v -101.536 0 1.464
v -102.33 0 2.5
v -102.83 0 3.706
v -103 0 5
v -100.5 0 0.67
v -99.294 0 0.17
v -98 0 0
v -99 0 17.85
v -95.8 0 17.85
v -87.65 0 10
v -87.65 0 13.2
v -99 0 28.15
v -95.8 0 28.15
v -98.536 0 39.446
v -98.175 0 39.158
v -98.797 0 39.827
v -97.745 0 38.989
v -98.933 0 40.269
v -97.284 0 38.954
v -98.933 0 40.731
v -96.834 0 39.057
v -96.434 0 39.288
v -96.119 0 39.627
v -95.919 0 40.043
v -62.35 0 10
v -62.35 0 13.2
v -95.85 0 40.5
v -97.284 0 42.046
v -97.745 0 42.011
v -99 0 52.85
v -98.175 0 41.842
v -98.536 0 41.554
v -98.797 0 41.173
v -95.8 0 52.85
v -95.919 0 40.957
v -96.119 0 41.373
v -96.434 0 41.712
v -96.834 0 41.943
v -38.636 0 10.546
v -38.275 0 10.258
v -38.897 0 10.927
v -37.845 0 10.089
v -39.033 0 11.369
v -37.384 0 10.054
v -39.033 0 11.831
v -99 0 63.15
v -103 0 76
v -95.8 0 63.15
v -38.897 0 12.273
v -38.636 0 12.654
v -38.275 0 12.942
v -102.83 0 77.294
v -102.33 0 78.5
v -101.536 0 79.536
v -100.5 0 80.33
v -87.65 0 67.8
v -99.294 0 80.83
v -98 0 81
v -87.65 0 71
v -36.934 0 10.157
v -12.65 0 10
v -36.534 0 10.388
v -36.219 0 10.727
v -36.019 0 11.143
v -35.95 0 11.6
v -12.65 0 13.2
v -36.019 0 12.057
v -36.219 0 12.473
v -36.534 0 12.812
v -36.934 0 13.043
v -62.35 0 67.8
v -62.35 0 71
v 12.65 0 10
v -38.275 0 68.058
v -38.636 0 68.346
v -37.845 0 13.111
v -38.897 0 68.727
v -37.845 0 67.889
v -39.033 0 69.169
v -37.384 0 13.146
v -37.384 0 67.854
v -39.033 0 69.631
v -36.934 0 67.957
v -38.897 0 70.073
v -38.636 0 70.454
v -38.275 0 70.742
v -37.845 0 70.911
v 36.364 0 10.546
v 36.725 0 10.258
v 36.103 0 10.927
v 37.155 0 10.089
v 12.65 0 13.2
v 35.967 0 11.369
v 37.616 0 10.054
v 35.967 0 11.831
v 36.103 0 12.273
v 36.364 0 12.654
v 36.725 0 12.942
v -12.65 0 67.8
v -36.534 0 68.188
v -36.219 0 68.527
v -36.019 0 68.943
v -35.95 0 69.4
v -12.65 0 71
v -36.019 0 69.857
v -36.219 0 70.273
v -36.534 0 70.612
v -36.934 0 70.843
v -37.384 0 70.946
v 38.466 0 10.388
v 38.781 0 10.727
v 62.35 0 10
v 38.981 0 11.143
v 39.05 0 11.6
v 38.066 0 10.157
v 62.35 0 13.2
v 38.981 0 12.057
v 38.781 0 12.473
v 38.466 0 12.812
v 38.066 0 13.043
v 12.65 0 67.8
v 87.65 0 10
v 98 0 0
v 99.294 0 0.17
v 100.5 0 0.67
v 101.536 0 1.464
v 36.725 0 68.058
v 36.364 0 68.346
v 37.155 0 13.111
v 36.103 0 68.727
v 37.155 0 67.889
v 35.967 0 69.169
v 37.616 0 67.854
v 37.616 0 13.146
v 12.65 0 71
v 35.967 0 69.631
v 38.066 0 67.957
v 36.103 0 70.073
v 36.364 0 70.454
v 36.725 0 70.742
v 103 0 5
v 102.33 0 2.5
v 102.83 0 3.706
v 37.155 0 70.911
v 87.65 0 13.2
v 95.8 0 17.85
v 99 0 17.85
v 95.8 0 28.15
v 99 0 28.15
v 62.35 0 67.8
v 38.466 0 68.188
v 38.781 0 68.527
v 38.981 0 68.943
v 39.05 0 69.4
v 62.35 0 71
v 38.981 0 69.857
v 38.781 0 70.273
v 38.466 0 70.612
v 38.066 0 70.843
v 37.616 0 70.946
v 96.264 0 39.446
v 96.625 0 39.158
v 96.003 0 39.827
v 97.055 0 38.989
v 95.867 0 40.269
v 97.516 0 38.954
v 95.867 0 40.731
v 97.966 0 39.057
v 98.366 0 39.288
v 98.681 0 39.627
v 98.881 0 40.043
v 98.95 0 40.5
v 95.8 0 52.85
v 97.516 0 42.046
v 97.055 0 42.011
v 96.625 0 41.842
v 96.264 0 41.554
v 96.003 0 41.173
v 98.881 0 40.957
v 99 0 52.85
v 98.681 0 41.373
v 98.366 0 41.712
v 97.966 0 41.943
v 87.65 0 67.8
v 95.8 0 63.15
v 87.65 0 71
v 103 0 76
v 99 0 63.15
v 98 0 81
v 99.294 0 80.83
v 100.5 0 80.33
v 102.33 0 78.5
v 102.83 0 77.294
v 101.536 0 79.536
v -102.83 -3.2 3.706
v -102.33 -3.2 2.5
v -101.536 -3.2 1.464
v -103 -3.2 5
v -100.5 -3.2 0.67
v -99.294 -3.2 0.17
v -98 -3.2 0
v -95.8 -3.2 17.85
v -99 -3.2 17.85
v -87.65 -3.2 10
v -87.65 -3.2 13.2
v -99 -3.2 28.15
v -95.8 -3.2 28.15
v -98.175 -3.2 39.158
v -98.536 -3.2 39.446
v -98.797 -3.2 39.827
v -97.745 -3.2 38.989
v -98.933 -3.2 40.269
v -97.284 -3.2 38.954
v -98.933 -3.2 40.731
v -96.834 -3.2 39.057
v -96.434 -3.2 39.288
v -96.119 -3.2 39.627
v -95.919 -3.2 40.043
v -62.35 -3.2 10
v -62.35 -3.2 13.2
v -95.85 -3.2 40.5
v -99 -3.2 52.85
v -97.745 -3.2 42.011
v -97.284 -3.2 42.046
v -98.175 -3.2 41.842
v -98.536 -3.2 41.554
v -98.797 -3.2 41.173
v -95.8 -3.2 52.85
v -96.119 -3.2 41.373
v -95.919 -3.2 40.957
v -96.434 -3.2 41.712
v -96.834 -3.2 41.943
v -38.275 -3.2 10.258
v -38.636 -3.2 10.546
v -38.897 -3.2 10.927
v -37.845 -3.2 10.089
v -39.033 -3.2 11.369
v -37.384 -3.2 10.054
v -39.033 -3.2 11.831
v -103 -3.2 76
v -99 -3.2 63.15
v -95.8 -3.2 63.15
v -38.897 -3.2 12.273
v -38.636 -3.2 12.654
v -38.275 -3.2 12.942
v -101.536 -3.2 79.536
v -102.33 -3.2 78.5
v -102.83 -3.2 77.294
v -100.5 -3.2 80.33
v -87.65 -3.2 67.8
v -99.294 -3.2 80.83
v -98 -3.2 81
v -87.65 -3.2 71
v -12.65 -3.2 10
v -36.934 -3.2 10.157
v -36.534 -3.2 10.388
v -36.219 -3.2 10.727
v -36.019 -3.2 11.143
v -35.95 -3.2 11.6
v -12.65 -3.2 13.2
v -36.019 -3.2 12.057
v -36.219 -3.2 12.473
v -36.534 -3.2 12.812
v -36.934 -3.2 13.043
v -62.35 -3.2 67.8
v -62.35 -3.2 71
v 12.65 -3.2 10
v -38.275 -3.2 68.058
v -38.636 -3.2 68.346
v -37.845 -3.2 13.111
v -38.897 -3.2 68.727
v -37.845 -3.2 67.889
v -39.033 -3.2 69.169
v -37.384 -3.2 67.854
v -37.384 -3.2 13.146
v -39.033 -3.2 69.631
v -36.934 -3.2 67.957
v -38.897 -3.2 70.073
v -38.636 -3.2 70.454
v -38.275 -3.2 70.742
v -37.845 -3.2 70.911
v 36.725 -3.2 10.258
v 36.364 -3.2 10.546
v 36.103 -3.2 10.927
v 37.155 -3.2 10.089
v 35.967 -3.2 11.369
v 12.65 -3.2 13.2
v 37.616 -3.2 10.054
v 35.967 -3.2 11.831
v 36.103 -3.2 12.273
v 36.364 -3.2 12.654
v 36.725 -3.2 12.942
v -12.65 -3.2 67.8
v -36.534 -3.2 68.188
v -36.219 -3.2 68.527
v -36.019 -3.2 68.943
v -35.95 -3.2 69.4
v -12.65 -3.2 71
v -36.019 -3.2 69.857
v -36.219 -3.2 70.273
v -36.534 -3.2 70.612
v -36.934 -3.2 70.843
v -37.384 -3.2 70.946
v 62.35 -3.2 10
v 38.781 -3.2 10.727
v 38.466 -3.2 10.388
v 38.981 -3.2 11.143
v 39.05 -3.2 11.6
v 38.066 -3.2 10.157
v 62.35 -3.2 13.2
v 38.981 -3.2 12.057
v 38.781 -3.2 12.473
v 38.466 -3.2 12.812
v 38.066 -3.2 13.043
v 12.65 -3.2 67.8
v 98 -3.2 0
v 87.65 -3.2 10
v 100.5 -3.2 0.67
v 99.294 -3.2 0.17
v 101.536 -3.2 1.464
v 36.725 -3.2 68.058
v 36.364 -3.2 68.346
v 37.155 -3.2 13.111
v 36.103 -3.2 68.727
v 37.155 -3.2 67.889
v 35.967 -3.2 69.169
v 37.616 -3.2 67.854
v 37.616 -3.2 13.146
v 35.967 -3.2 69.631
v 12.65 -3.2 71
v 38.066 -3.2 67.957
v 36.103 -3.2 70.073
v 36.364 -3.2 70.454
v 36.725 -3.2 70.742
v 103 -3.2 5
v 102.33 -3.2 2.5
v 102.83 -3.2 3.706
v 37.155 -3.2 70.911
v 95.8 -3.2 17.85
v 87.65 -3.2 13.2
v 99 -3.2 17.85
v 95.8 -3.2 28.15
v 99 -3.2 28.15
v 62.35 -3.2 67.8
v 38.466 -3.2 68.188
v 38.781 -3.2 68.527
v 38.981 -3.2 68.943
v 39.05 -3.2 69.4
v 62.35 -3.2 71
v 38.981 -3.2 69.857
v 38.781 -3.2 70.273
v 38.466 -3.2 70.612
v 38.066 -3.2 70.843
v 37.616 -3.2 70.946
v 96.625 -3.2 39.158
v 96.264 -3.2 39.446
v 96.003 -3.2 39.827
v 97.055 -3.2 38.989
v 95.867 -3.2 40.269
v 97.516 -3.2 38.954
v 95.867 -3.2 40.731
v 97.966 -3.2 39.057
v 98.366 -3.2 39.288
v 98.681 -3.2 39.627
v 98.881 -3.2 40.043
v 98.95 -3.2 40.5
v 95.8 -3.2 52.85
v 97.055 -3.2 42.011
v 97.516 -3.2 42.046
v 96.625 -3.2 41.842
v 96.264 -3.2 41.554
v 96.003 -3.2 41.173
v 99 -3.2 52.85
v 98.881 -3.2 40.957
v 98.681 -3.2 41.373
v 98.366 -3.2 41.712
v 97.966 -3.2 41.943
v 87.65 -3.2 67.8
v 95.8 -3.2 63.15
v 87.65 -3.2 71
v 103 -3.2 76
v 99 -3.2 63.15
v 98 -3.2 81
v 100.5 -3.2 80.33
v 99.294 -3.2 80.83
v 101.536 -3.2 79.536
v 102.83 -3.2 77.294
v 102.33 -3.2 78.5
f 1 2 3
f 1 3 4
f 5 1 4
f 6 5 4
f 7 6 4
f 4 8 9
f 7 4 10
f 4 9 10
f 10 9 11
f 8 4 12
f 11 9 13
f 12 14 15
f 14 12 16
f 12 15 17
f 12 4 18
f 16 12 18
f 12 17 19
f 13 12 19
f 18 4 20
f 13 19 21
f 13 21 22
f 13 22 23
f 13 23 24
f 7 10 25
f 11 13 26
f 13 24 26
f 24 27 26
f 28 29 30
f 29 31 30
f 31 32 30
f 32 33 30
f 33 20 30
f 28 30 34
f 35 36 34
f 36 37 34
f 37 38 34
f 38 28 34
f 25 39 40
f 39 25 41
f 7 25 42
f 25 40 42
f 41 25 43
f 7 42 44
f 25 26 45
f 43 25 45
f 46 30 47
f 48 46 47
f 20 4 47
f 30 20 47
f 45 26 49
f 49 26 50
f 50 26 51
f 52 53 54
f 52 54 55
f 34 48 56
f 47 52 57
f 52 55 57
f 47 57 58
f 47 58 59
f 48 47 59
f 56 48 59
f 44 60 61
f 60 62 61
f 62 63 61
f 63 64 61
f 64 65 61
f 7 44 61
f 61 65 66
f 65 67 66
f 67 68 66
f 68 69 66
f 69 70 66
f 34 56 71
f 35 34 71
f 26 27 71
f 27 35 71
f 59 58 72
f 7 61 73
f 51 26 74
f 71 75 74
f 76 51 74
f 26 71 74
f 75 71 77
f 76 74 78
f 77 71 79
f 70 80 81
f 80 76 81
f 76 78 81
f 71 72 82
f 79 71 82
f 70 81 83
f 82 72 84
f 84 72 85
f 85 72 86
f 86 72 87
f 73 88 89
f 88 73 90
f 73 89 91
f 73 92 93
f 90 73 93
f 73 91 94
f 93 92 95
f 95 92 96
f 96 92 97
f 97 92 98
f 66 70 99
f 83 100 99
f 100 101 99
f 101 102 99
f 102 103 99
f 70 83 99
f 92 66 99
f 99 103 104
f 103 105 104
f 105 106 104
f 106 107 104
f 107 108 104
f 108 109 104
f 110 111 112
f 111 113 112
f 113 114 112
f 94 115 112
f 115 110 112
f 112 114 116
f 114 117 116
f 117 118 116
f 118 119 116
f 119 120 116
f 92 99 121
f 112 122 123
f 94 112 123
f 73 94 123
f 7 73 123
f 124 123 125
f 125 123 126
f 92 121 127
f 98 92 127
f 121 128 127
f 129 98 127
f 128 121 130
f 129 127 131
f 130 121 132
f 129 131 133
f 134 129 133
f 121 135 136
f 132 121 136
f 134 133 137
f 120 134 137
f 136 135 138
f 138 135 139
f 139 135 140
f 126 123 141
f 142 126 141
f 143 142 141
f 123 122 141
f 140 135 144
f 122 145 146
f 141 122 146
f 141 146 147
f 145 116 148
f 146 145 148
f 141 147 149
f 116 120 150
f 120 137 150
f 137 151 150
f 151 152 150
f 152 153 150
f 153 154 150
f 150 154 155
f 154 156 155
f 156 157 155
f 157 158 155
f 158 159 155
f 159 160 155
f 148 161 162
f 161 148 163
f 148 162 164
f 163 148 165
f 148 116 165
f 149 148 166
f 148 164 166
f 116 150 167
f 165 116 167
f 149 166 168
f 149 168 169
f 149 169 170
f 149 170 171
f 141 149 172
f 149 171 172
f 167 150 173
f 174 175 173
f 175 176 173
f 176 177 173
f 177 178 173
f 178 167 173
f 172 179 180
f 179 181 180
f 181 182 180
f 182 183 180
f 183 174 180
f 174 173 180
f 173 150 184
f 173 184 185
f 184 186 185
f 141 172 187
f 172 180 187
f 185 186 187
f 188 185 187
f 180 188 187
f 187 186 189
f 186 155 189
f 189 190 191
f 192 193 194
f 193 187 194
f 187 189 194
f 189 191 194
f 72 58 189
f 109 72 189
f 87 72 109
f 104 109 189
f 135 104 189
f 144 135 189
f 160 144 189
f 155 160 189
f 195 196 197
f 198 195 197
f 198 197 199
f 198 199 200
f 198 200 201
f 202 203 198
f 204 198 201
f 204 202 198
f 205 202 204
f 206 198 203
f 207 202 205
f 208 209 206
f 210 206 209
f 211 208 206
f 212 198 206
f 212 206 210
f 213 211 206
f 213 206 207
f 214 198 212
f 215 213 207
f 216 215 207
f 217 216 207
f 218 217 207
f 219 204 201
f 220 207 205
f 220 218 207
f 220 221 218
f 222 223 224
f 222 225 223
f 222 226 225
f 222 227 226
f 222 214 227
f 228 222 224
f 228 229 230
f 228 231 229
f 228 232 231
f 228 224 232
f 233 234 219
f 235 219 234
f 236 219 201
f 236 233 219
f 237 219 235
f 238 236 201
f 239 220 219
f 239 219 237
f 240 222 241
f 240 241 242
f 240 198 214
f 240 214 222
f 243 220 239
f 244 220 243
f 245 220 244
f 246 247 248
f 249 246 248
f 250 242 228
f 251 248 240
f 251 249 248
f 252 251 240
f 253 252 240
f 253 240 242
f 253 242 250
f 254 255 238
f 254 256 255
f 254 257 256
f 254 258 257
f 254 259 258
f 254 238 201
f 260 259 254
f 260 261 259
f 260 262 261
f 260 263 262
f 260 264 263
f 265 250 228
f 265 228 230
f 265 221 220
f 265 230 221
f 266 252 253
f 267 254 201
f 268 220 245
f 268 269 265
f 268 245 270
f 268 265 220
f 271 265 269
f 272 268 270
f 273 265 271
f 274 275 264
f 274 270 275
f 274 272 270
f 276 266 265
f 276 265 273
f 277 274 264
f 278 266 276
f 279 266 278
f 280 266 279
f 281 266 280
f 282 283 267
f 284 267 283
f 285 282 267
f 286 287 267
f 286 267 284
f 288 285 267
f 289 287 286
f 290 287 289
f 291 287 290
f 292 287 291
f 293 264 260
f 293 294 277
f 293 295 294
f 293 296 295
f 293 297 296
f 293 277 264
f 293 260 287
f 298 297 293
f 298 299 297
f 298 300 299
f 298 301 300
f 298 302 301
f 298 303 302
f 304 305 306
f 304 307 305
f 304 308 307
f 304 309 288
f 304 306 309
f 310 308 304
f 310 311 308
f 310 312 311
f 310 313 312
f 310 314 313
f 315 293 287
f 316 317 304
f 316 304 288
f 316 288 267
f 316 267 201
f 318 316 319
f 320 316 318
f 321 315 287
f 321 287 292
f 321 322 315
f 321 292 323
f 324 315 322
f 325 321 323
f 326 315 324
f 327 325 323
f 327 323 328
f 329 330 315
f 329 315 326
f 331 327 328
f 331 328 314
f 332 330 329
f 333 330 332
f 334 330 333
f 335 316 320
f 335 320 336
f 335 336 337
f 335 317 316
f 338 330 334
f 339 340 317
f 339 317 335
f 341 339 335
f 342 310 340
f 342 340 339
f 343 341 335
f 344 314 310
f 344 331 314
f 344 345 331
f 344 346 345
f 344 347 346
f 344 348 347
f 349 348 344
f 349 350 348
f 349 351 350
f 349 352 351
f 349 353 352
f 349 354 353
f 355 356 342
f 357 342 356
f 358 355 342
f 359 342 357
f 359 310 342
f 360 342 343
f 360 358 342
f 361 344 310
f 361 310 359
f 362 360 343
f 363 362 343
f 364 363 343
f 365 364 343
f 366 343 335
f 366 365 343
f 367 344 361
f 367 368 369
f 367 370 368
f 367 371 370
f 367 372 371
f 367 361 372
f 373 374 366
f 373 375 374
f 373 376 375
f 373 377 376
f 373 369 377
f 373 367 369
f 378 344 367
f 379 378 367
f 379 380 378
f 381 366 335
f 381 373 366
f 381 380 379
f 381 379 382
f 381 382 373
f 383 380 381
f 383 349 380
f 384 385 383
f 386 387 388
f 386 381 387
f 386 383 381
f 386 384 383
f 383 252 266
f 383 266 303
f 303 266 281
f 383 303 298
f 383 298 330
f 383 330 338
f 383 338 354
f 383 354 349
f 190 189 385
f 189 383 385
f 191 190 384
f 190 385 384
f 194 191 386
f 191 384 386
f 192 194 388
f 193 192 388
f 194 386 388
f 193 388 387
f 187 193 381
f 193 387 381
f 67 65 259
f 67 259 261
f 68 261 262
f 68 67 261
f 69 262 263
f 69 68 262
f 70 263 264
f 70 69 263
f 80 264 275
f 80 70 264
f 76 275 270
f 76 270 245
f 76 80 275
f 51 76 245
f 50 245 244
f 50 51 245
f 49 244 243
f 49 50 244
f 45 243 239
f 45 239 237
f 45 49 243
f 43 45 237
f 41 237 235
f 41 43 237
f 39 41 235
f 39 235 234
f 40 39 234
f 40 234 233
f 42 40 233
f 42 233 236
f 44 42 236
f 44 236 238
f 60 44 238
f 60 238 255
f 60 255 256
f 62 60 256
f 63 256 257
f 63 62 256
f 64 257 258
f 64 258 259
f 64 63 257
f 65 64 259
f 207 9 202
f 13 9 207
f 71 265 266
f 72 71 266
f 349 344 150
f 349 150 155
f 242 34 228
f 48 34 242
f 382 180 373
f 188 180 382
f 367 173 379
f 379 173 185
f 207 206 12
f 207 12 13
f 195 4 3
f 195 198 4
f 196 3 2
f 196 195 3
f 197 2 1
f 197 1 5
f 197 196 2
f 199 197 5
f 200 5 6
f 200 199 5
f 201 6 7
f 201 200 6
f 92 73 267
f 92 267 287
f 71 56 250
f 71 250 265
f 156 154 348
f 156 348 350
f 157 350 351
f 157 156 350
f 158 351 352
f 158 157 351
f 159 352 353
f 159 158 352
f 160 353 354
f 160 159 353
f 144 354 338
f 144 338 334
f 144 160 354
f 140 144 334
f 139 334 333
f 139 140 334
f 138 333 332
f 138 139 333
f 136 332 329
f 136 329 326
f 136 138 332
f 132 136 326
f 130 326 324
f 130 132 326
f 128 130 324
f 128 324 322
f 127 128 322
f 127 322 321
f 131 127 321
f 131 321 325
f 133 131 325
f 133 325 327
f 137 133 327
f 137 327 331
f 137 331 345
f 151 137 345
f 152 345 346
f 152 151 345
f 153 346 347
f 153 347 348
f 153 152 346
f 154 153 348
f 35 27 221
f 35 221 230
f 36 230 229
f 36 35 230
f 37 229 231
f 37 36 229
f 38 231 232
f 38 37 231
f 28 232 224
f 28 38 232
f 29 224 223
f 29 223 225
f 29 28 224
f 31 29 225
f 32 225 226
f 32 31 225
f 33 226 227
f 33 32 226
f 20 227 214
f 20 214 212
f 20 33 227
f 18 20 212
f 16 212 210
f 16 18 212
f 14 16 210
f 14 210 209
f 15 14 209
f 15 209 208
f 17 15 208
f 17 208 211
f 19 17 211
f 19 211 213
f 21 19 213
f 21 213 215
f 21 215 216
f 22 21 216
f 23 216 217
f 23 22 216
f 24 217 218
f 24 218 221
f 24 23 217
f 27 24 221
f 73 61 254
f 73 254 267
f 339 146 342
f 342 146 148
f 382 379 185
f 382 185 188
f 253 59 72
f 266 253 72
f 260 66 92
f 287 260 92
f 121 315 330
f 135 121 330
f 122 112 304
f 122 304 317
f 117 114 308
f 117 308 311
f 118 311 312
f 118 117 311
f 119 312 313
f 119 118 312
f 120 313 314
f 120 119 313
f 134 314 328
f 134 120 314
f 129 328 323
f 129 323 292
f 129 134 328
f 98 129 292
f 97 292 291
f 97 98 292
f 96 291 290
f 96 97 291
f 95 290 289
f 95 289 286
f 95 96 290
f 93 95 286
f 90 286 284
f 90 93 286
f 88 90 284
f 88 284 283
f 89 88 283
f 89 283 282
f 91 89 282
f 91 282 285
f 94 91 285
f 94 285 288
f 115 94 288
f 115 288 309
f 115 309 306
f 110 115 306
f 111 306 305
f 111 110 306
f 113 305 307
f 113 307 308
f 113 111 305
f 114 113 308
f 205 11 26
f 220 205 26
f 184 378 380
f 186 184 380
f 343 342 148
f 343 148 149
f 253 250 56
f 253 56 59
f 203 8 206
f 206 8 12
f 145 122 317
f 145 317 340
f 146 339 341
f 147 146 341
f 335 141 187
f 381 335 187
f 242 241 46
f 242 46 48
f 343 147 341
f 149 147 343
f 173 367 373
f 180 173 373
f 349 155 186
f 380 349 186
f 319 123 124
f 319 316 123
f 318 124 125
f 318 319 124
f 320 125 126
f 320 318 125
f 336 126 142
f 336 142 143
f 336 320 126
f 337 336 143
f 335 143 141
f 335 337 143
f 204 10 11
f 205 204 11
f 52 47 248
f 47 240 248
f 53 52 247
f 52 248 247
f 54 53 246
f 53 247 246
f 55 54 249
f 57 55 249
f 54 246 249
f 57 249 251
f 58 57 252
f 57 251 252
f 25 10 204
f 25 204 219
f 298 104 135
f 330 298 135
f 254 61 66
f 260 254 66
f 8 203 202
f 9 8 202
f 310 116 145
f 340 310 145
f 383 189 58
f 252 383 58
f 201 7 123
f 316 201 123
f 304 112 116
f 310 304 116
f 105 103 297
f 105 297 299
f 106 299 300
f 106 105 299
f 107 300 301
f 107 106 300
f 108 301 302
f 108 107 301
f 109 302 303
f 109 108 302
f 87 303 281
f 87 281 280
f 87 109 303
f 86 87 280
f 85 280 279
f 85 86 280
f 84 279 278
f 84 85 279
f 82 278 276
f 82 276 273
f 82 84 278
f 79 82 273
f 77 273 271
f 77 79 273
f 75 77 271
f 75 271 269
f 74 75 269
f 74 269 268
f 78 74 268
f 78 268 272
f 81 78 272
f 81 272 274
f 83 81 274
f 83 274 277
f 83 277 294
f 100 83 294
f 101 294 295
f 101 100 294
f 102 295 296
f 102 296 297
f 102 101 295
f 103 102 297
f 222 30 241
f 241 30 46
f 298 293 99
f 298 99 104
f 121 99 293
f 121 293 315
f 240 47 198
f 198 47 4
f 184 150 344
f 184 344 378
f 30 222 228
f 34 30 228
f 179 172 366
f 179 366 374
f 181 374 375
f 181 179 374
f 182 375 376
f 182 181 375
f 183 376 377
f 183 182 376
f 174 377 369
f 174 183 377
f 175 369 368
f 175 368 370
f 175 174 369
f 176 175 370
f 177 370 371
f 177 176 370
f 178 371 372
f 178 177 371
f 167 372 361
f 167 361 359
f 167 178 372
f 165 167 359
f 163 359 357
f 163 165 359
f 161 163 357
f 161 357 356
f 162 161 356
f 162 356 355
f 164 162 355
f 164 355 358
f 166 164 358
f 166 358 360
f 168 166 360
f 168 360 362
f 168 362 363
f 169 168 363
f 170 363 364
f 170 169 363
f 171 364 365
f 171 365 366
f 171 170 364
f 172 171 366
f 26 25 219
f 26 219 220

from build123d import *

# Parameters (mm, degrees)
F1_W     = 25.3
F1_H     = 3.2
F1_R     = 1.55
F1_W_2   = 3.2
F1_H_2   = 10.3
F2_DEPTH = 3.2
F3_R     = 5


with BuildPart() as f2:
    # F1 (on Front) → F2 (new body)
    with BuildSketch(Plane.XZ):
        Polygon((-99, 81), (-103, 81), (-103, 0), (-99, 0), (99, 0), (103, 0), (103, 81), (99, 81), align=None)
        with Locations((-75, 11.6)):
            Rectangle(F1_W, F1_H, mode=Mode.SUBTRACT)
        with Locations((-37.5, 11.6)):
            Circle(F1_R, mode=Mode.SUBTRACT)
        with Locations((0, 11.6)):
            Rectangle(F1_W, F1_H, mode=Mode.SUBTRACT)
        with Locations((-97.4, 23)):
            Rectangle(F1_W_2, F1_H_2, mode=Mode.SUBTRACT)
        with Locations((37.5, 11.6)):
            Circle(F1_R, mode=Mode.SUBTRACT)
        with Locations((75, 11.6)):
            Rectangle(F1_W, F1_H, mode=Mode.SUBTRACT)
        with Locations((97.4, 23)):
            Rectangle(F1_W_2, F1_H_2, mode=Mode.SUBTRACT)
        with Locations((-97.4, 40.5)):
            Circle(F1_R, mode=Mode.SUBTRACT)
        with Locations((-97.4, 58)):
            Rectangle(F1_W_2, F1_H_2, mode=Mode.SUBTRACT)
        with Locations((-75, 69.4)):
            Rectangle(F1_W, F1_H, mode=Mode.SUBTRACT)
        with Locations((-37.5, 69.4)):
            Circle(F1_R, mode=Mode.SUBTRACT)
        with Locations((0, 69.4)):
            Rectangle(F1_W, F1_H, mode=Mode.SUBTRACT)
        with Locations((97.4, 40.5)):
            Circle(F1_R, mode=Mode.SUBTRACT)
        with Locations((97.4, 58)):
            Rectangle(F1_W_2, F1_H_2, mode=Mode.SUBTRACT)
        with Locations((37.5, 69.4)):
            Circle(F1_R, mode=Mode.SUBTRACT)
        with Locations((75, 69.4)):
            Rectangle(F1_W, F1_H, mode=Mode.SUBTRACT)
    extrude(amount=F2_DEPTH)

    # F3
    f3_edges = [f2.edges().sort_by_distance(p)[0] for p in [
        (-103, -1.6, 81),
        (-103, -1.6, 0),
        (103, -1.6, 81),
        (103, -1.6, 0),
    ]]
    fillet(f3_edges, radius=F3_R)


solid = f2.part
